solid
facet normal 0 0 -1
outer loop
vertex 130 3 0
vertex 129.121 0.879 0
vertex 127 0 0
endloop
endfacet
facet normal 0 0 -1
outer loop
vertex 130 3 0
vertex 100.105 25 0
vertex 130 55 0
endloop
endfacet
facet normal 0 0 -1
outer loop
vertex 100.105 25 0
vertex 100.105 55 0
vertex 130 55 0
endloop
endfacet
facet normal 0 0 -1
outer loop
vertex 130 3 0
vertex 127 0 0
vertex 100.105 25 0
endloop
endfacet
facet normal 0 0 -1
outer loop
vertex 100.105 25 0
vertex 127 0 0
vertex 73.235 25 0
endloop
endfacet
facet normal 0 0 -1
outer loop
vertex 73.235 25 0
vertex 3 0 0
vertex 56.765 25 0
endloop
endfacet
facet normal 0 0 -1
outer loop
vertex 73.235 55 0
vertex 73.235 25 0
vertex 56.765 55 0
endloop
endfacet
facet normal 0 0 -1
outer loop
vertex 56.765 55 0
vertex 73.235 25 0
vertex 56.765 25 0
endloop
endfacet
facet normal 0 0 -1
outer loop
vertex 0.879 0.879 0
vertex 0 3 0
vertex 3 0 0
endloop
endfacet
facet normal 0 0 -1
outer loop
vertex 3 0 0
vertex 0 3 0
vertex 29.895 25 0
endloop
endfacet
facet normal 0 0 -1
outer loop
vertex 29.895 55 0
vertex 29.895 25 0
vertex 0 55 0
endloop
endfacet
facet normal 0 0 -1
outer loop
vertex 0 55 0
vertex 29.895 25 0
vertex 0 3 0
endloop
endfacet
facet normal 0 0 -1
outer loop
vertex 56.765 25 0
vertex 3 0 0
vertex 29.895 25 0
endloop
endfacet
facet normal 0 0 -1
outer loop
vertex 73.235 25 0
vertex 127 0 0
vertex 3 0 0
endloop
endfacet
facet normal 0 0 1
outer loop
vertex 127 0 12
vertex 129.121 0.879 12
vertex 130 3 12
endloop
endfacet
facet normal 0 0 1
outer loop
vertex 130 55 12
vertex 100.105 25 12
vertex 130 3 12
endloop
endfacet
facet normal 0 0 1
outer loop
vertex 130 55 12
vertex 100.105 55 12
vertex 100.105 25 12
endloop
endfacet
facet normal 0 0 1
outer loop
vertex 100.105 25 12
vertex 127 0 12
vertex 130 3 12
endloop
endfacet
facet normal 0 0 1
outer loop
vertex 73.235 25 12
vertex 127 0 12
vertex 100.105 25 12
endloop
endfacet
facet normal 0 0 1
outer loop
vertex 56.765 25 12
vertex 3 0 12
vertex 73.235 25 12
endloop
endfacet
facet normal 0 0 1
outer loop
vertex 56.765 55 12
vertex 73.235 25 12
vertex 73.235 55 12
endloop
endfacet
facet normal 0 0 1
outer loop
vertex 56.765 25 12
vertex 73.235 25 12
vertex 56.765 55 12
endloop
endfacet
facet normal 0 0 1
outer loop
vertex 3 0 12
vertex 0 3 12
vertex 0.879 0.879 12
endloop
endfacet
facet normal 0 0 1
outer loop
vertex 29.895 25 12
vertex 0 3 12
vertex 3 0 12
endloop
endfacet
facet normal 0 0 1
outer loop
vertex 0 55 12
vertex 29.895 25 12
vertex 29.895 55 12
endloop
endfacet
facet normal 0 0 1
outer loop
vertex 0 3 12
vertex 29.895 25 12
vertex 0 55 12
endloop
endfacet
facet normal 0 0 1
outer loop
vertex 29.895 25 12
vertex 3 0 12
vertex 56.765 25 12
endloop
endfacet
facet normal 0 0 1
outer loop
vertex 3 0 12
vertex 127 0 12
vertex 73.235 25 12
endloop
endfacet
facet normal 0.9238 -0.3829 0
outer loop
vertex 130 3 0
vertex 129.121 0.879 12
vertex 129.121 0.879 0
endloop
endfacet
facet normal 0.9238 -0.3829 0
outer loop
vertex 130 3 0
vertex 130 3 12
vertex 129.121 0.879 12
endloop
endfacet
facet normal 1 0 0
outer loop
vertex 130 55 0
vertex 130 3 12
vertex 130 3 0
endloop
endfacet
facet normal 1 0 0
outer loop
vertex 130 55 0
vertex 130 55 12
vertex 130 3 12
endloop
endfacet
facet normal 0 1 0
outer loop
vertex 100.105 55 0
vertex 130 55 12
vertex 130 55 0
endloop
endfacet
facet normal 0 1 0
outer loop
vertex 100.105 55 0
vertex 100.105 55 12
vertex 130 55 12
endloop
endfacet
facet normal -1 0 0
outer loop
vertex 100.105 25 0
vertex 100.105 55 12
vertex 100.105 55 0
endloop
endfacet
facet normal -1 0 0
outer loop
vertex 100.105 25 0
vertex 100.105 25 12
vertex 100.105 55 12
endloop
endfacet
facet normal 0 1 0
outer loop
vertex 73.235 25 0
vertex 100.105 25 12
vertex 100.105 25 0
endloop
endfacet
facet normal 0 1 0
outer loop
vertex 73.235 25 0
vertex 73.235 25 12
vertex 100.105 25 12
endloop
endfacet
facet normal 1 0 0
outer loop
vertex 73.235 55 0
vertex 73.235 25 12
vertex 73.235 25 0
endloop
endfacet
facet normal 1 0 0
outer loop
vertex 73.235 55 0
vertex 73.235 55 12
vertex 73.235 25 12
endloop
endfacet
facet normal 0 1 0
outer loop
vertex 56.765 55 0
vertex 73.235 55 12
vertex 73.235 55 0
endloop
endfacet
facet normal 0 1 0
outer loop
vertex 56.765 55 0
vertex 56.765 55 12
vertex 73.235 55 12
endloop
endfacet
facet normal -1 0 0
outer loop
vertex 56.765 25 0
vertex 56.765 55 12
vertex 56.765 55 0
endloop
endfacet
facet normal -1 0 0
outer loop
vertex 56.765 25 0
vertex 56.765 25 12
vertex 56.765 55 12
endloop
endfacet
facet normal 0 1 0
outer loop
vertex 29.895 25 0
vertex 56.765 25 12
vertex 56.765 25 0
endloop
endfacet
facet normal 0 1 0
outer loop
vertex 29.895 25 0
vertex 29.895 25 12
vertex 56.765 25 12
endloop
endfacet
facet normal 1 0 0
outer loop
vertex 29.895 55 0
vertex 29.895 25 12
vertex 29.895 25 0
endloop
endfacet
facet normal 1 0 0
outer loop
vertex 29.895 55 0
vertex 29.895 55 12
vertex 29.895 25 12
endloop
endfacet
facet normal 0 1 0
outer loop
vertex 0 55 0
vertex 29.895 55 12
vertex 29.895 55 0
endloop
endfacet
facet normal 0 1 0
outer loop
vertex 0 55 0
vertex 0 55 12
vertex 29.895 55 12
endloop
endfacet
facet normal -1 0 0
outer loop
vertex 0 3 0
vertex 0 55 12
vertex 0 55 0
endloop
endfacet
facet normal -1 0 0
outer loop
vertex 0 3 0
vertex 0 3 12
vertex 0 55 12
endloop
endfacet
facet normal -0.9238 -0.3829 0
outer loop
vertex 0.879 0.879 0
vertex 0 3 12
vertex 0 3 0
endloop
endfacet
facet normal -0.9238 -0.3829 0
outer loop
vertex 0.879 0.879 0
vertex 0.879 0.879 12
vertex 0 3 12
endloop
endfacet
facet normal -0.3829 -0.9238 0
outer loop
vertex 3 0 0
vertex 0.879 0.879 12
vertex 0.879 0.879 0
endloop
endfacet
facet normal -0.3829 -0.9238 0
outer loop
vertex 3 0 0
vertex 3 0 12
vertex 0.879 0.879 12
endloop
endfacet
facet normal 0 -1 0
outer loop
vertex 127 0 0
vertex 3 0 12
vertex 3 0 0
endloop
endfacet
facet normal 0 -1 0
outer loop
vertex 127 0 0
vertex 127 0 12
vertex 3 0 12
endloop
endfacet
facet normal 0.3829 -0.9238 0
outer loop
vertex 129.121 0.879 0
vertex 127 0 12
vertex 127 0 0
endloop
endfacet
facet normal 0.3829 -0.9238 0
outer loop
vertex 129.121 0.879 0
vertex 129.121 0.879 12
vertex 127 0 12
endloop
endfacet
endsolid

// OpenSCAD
$fn = 32;

// ----------------------------------------------------------------------
// Window plate: 130 x 55 mm, 2 open windows
// ----------------------------------------------------------------------

// --- parameters (mm) ---
profile_height = 12;      // extrusion height
profile_points = 16;      // points of the closed outline

profile = [[0, 3], [0.879, 0.879], [3, 0], [127, 0], [129.121, 0.879], [130, 3], [130, 55], [100.105, 55], [100.105, 25], [73.235, 25], [73.235, 55], [56.765, 55], [56.765, 25], [29.895, 25], [29.895, 55], [0, 55]];  // single closed polygon, 16 points, counter clockwise

// --- the one profile operation ---
linear_extrude(height = profile_height) polygon(points = profile);
